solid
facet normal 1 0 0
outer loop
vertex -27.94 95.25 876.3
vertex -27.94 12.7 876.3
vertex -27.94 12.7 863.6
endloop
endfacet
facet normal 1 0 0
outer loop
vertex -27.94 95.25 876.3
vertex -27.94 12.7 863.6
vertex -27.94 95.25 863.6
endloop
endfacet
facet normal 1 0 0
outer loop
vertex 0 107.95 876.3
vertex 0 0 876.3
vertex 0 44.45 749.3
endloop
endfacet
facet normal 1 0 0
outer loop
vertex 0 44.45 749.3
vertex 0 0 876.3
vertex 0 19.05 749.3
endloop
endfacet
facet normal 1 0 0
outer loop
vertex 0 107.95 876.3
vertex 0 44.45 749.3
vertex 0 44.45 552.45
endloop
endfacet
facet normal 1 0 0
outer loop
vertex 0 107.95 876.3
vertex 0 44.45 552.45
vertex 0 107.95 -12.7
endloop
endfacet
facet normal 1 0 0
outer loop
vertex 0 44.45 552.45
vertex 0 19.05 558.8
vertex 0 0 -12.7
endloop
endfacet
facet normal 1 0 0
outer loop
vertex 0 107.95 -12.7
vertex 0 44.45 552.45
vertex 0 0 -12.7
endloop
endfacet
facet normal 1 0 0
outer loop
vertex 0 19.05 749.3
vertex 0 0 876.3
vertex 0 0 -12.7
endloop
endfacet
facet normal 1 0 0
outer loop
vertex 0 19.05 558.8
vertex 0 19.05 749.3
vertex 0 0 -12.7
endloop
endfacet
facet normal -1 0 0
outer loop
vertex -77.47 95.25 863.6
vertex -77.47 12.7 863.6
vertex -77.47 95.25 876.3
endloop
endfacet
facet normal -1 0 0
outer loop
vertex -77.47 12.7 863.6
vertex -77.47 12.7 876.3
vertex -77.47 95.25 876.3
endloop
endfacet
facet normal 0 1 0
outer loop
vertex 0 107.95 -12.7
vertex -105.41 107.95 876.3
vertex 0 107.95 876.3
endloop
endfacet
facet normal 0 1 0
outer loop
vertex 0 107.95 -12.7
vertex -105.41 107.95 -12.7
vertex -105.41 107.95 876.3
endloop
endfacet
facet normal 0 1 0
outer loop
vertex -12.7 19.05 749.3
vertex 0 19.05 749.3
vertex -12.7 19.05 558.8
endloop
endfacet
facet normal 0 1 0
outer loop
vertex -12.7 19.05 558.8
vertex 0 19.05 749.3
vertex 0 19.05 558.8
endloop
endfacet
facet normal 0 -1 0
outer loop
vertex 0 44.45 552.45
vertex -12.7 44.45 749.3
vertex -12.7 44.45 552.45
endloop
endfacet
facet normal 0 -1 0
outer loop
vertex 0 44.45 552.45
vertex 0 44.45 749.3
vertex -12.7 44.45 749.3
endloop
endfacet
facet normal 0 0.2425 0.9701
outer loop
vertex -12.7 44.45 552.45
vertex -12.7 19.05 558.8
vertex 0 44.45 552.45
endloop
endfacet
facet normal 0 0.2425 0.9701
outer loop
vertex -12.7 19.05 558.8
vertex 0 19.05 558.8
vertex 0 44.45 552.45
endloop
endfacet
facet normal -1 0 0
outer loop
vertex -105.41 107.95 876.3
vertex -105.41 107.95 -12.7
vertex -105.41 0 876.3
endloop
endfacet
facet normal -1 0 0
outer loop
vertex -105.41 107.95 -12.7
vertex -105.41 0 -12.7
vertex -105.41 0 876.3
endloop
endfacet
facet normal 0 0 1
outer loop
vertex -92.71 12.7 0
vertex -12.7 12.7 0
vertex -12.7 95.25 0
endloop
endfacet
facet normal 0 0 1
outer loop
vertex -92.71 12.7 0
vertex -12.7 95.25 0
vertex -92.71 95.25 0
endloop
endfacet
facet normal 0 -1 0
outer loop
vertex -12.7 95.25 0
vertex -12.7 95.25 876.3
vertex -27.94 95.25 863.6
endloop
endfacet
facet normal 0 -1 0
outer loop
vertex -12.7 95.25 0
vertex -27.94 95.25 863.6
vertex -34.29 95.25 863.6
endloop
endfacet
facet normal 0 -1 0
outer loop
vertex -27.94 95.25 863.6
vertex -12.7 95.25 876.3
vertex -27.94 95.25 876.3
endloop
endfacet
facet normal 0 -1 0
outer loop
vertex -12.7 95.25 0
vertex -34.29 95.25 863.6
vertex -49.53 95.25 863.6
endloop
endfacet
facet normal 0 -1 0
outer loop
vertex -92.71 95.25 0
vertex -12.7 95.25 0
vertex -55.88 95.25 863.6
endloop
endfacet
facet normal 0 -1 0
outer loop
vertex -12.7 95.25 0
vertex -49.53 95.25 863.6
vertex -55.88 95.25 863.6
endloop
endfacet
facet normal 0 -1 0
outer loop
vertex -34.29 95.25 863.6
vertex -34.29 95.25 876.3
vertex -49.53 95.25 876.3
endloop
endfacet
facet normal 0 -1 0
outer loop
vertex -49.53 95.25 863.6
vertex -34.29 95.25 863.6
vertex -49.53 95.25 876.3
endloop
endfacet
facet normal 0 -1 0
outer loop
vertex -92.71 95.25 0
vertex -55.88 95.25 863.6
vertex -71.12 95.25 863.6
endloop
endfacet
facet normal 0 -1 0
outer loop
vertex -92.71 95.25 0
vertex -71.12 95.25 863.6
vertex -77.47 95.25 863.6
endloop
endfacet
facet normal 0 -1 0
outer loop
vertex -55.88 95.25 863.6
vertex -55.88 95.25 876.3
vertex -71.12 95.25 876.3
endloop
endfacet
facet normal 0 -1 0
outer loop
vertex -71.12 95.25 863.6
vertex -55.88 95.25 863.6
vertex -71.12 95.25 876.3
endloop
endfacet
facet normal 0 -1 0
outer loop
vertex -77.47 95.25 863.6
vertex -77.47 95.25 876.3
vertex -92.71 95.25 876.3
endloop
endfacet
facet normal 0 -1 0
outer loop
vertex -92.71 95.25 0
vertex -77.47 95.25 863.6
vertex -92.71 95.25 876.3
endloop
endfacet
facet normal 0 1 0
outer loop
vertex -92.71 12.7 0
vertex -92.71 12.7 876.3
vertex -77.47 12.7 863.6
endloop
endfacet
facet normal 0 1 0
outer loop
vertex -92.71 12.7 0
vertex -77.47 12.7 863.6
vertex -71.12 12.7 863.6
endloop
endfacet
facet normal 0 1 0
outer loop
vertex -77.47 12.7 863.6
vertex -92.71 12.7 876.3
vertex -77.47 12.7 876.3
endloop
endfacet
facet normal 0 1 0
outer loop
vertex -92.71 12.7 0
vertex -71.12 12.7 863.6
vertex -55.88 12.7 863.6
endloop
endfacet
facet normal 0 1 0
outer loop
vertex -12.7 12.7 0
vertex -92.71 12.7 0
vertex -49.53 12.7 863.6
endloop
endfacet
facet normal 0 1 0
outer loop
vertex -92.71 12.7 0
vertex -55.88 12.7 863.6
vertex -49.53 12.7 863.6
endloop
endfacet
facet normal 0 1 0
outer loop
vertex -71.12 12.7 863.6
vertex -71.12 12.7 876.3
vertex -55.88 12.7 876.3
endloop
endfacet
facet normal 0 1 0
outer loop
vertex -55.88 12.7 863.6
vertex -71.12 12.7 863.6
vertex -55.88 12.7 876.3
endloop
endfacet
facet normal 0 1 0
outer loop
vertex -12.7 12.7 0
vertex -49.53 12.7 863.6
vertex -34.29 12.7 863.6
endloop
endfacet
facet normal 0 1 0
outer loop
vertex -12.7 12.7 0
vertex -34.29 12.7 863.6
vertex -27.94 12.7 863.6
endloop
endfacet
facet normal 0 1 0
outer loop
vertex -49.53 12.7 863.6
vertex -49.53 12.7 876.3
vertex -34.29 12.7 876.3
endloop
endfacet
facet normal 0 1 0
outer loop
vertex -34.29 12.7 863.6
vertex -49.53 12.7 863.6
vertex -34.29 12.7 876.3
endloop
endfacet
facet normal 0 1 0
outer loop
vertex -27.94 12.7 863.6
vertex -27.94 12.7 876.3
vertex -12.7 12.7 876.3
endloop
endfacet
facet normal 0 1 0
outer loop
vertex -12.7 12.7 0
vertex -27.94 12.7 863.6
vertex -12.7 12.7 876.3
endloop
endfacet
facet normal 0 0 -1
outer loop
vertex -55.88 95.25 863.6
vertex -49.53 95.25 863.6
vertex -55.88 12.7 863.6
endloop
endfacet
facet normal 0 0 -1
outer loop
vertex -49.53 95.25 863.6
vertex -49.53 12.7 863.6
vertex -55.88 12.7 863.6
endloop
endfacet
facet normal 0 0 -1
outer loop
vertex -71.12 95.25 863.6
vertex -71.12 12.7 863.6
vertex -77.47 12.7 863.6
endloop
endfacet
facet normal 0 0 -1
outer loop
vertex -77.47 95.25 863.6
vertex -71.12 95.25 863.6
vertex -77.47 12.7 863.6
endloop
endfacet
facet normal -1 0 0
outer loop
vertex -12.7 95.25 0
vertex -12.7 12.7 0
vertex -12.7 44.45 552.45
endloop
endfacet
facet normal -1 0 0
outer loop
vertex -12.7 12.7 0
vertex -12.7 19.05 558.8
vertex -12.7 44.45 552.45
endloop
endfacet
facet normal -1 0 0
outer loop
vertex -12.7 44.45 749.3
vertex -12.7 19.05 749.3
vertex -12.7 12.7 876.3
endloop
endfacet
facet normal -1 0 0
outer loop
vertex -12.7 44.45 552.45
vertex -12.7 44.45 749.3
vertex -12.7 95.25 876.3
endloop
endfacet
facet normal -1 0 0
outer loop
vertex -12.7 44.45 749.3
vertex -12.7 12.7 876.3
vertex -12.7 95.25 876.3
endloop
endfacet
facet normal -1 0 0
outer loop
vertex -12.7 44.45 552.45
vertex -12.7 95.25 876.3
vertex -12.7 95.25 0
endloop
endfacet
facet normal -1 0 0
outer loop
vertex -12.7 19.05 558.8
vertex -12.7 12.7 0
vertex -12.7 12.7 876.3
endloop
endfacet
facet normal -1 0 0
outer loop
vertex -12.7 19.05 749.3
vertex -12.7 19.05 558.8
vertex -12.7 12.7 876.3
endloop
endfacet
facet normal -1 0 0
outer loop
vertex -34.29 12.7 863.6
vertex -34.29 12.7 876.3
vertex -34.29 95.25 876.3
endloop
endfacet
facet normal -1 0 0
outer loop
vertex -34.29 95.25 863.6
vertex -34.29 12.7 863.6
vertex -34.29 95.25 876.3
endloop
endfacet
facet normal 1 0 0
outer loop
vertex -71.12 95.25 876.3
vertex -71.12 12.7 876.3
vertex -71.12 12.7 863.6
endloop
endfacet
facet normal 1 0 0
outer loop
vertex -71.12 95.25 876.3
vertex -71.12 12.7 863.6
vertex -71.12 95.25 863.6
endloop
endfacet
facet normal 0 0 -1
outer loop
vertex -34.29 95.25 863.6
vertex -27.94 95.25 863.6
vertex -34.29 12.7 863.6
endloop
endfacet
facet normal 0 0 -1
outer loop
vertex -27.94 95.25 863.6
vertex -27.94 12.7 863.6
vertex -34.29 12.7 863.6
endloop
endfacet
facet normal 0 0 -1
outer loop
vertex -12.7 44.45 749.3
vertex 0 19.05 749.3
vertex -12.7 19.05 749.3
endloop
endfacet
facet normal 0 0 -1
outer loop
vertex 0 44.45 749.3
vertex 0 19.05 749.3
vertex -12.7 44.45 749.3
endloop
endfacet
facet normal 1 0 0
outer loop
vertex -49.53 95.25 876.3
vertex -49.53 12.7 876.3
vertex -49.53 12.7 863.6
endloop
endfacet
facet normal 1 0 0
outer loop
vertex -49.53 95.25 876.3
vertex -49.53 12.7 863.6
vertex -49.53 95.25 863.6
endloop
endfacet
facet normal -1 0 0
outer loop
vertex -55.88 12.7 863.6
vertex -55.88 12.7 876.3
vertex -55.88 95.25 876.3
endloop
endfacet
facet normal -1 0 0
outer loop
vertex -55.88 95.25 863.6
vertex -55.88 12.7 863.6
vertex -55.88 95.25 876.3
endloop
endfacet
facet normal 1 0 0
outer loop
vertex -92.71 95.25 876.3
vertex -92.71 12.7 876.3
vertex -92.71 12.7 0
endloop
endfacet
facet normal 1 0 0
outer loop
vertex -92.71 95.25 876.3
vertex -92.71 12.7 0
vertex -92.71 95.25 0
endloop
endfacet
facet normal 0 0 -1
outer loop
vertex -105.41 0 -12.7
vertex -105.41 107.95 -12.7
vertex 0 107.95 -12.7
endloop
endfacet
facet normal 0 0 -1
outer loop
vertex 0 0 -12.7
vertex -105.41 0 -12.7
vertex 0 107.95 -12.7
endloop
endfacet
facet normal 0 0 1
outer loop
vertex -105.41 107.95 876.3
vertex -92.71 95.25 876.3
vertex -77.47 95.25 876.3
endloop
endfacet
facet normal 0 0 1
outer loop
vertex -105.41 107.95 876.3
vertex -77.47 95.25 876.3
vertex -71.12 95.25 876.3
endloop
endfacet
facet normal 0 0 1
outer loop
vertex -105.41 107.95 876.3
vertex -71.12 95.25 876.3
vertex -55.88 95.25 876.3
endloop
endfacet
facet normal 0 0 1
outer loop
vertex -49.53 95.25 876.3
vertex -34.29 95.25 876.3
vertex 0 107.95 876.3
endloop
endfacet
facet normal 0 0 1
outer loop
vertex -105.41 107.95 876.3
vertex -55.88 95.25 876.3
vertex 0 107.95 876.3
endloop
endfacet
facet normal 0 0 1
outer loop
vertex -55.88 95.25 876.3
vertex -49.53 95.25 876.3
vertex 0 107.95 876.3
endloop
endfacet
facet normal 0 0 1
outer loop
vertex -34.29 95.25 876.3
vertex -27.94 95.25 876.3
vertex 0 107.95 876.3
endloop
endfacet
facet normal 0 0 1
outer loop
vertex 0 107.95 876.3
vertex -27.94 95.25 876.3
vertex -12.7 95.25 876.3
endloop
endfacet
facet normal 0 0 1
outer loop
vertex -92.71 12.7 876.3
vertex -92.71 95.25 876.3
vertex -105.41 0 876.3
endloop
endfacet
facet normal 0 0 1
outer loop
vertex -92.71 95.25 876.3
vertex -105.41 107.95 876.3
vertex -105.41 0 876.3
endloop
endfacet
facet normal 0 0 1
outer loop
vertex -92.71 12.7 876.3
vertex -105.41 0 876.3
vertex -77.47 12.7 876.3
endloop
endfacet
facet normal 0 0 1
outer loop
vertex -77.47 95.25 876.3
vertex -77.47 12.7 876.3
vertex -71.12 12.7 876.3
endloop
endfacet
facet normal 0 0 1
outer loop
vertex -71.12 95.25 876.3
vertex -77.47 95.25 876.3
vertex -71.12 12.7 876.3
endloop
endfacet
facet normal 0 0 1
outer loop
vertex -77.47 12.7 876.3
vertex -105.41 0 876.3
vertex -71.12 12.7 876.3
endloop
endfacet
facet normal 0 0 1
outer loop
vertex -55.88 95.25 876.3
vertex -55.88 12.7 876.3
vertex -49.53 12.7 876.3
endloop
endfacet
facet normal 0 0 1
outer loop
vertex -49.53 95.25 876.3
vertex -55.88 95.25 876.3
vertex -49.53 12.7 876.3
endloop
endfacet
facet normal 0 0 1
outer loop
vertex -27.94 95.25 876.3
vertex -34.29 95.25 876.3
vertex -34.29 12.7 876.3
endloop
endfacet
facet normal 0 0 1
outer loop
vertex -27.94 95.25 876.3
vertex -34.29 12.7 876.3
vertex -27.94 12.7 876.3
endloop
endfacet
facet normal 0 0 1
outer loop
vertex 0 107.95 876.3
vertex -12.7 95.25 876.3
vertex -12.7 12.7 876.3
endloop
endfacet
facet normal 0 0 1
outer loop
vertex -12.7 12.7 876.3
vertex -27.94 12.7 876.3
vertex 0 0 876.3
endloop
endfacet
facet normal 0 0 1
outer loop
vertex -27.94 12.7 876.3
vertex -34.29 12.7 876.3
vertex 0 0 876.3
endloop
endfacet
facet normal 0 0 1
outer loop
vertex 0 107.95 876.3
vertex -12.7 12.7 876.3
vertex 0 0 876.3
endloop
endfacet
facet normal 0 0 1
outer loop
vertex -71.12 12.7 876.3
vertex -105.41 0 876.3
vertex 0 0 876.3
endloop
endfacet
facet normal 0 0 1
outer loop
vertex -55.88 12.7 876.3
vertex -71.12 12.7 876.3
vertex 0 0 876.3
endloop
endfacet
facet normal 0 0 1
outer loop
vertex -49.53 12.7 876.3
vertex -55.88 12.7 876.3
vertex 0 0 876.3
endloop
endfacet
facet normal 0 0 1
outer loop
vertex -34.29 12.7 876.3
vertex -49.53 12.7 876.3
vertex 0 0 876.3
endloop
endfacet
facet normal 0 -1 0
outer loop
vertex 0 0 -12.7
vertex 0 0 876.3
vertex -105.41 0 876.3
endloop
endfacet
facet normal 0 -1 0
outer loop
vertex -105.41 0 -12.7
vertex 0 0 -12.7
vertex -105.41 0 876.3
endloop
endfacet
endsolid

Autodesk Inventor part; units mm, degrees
ref_plane "YZ Plane" through (0, 0, 0) normal (1, 0, 0) x (0, 1, 0)
ref_plane "XZ Plane" through (0, 0, 0) normal (0, 1, 0) x (-1, 0, 0)
ref_plane "XY Plane" through (0, 0, 0) normal (0, 0, 1) x (1, 0, 0)
sketch "Sketch1" plane through (0, 0, 0) normal (0, 1, 0) x (-1, 0, 0)
  line L0 (0, 0) -> (105.41, 0)
  line L1 (105.41, 0) -> (105.41, 863.6)
  line L2 (105.41, 863.6) -> (0, 863.6)
  line L3 (0, 863.6) -> (0, 0)
  dimension "d0" = 105.41
  dimension "d1" = 863.6
extrude "Extrusion1" add sketch "Sketch1" along normal blind 12.7
sketch "Sketch2" plane through (0, 12.7, 0) normal (0, 1, 0) x (1, 0, 0)
  line L0 (0, 0) -> (-105.41, 0) projected
  line L1 (0, 0) -> (-12.7, 0)
  line L2 (-12.7, 0) -> (-12.7, 12.7)
  line L3 (-12.7, 12.7) -> (0, 12.7)
  line L4 (0, 12.7) -> (0, 0)
  line L5 (-105.41, 0) -> (-105.41, -863.6) projected
  line L6 (0, 12.7) -> (-105.41, 12.7)
  line L7 (-105.41, 12.7) -> (-105.41, 0)
  line L8 (-105.41, 0) -> (0, 0)
  line L9 (0, 0) -> (0, 12.7)
  line L10 (0, -863.6) -> (0, 0) projected
  line L11 (0, -863.6) -> (-105.41, -863.6)
  line L12 (-105.41, -863.6) -> (-105.41, -876.3)
  line L13 (-105.41, -876.3) -> (0, -876.3)
  line L14 (0, -876.3) -> (0, -863.6)
  line L15 (-105.41, -863.6) -> (-92.71, -863.6)
  line L16 (-92.71, -863.6) -> (-92.71, 12.7)
  line L17 (-92.71, 12.7) -> (-105.41, 12.7)
  line L18 (-105.41, 12.7) -> (-105.41, -863.6)
  line L19 (0, 12.7) -> (-12.7, 12.7)
  line L20 (-12.7, 12.7) -> (-12.7, -876.3)
  line L21 (-12.7, -876.3) -> (0, -876.3)
  line L22 (0, -876.3) -> (0, 12.7)
  point P0 (-12.7, -863.6)
  point P1 (-92.71, 0)
  dimension "d4" = 12.7
  dimension "d5" = 12.7
  dimension "d6" = 12.7
  dimension "d7" = 12.7
  dimension "d8" = 12.7
extrude "Extrusion2" add sketch "Sketch2" along normal blind 95.25 and the other way blind 12.7 contours L10 L11 L20 L0 | L0 L2 L3 L4 | L0 L16 L6 L2 | L14 L13 L20 L11 | L16 L11 L5 L0 | L0 L7 L6 L16 | L20 L13 L12 L11
sketch "Sketch3" plane through (-105.41, 107.95, 876.3) normal (0, 0, 1) x (1, 0, 0)
  line L0 (12.7, -95.25) -> (92.71, -95.25) projected
  line L1 (12.7, -95.25) -> (12.7, 0) projected
  line L2 (92.71, -95.25) -> (92.71, 0) projected
  line L3 (92.71, -95.25) -> (77.47, -95.25)
  line L4 (77.47, -95.25) -> (77.47, -12.7)
  line L5 (77.47, -12.7) -> (92.71, -12.7)
  line L6 (92.71, -12.7) -> (92.71, -95.25)
  line L7 (12.7, -95.25) -> (27.94, -95.25)
  line L8 (27.94, -95.25) -> (27.94, -12.7)
  line L9 (27.94, -12.7) -> (12.7, -12.7)
  line L10 (12.7, -12.7) -> (12.7, -95.25)
  line L11 (27.94, -95.25) -> (34.29, -95.25)
  line L12 (34.29, -95.25) -> (34.29, -12.7)
  line L13 (34.29, -12.7) -> (27.94, -12.7)
  line L14 (27.94, -12.7) -> (27.94, -95.25)
  line L15 (77.47, -95.25) -> (71.12, -95.25)
  line L16 (71.12, -95.25) -> (71.12, -12.7)
  line L17 (71.12, -12.7) -> (77.47, -12.7)
  line L18 (77.47, -12.7) -> (77.47, -95.25)
  line L19 (34.29, -95.25) -> (49.53, -95.25)
  line L20 (49.53, -95.25) -> (49.53, -12.7)
  line L21 (49.53, -12.7) -> (34.29, -12.7)
  line L22 (34.29, -12.7) -> (34.29, -95.25)
  line L23 (71.12, -95.25) -> (55.88, -95.25)
  line L24 (55.88, -95.25) -> (55.88, -12.7)
  line L25 (55.88, -12.7) -> (71.12, -12.7)
  line L26 (71.12, -12.7) -> (71.12, -95.25)
  point P0 (105.41, -107.95)
  dimension "d13" = 15.24
  dimension "d14" = 82.55
  dimension "d15" = 15.24
  dimension "d16" = 6.35
  dimension "d17" = 6.35
  dimension "d18" = 15.24
  dimension "d19" = 15.24
extrude "Extrusion3" cut sketch "Sketch3" against normal blind 95.25 contours L1 L9 L8 L0 | L24 L25 L16 L0 | L12 L21 L20 L0 | L4 L5 L2 L0
sketch "Sketch5" plane through (-105.41, 107.95, 876.3) normal (0, 0, 1) x (1, 0, 0)
  line L0 (71.12, -95.25) -> (55.88, -95.25) projected
  line L1 (55.88, -95.25) -> (55.88, -12.7) projected
  line L2 (55.88, -12.7) -> (71.12, -12.7) projected
  line L3 (71.12, -12.7) -> (71.12, -95.25) projected
  line L4 (49.53, -95.25) -> (34.29, -95.25) projected
  line L5 (34.29, -95.25) -> (34.29, -12.7) projected
  line L6 (34.29, -12.7) -> (49.53, -12.7) projected
  line L7 (49.53, -12.7) -> (49.53, -95.25) projected
  line L8 (92.71, -95.25) -> (77.47, -95.25) projected
  line L9 (77.47, -95.25) -> (77.47, -12.7) projected
  line L10 (77.47, -12.7) -> (92.71, -12.7) projected
  line L11 (92.71, -12.7) -> (92.71, -95.25) projected
  line L12 (27.94, -95.25) -> (12.7, -95.25) projected
  line L13 (12.7, -95.25) -> (12.7, -12.7) projected
  line L14 (12.7, -12.7) -> (27.94, -12.7) projected
  line L15 (27.94, -12.7) -> (27.94, -95.25) projected
  line L16 (105.41, -107.95) -> (105.41, 0) projected
  line L17 (0, 0) -> (105.41, 0) projected
  line L18 (0, -107.95) -> (0, 0) projected
  line L19 (105.41, -107.95) -> (0, -107.95) projected
  line L20 (92.71, 0) -> (12.7, 0) projected
  circle A0 centre (52.705, 26.3525) radius 26.3525
  dimension "d40" = 52.705
extrude "Extrusion4" add sketch "Sketch5" against normal blind 1270 contours A0
sketch "Sketch6" plane through (0, 0, -12.7) normal (1, 0, 0) x (0, 0, -1)
  line L0 (0, 0) -> (-889, 0) projected
  line L1 (-444.5, 0) -> (-444.5, 160.655)
  line L2 (-889, 160.655) -> (381, 160.655) projected
  line L3 (-444.5, 160.655) -> (-444.5, 167.005)
  line L4 (-444.5, 0) -> (-444.5, -6.35)
  line L5 (-444.5, 167.005) -> (-428.625, 167.005)
  line L6 (-428.625, 167.005) -> (-460.375, 167.005)
  line L7 (-428.625, 167.005) -> (-460.375, 167.005)
  line L8 (-460.375, 167.005) -> (-460.375, -6.35)
  line L9 (-460.375, -6.35) -> (-428.625, -6.35)
  line L10 (-428.625, -6.35) -> (-428.625, 167.005)
  line L11 (-889, 0) -> (-793.75, 0)
  line L12 (0, 107.95) -> (0, 0) projected
  line L13 (0, 0) -> (-95.25, 0)
  line L14 (-95.25, 0) -> (-95.25, -6.35)
  line L15 (-793.75, 0) -> (-793.75, -6.35)
  line L16 (-793.75, -6.35) -> (-762, -6.35)
  line L17 (-762, -6.35) -> (-762, 167.005)
  line L18 (-762, 167.005) -> (-793.75, 167.005)
  line L19 (-793.75, 167.005) -> (-793.75, -6.35)
  line L20 (-95.25, -6.35) -> (-127, -6.35)
  line L21 (-127, -6.35) -> (-127, 167.005)
  line L22 (-127, 167.005) -> (-95.25, 167.005)
  line L23 (-95.25, 167.005) -> (-95.25, -6.35)
  line L24 (-111.125, 167.005) -> (-111.125, -6.35)
  line L25 (-777.875, -6.35) -> (-777.875, 167.005)
  line L26 (-777.875, 79.2503) -> (-762, 79.2503)
  line L27 (-111.125, 68.9503) -> (-95.25, 68.9503)
  line L28 (-451.8389, 167.005) -> (-451.8389, 163.0426)
  circle A0 centre (-444.5, 148.7424) radius 10.8761
  circle A1 centre (-444.5, 11.9126) radius 11.9126
  line L29 (-456.4123, 12.0028) -> (-455.3758, 148.8248)
  line L30 (-433.6242, 148.8248) -> (-432.5877, 12.0028)
  line L31 (-127, 12.7) -> (-139.7, 12.7)
  line L32 (-139.7, 12.7) -> (-165.1, 12.7)
  line L33 (-460.375, 21.426) -> (-473.075, 21.426)
  line L34 (0, 107.95) -> (-889, 107.95) projected
  line L35 (-524.7767, 107.95) -> (-524.7767, 0)
  line L36 (-524.7767, 53.975) -> (-485.775, 53.975)
  circle A2 centre (-485.775, 53.975) radius 12.7
  line L37 (-498.475, 0) -> (-498.475, -3.175)
  line L38 (-498.475, -3.175) -> (-473.075, -3.175)
  line L39 (-473.075, -3.175) -> (-473.075, 53.975)
  line L40 (-498.475, 53.975) -> (-498.475, 0)
  line L41 (-694.0635, 0) -> (-694.0635, 19.05)
  line L42 (-762, 19.05) -> (-571.5, 19.05)
  line L43 (-687.1312, 19.05) -> (-687.1312, 44.45)
  line L44 (-762, 44.45) -> (-565.15, 44.45)
  line L45 (-571.5, 19.05) -> (-565.15, 44.45)
  point P0 (-12.7, 0)
  dimension "d25" = 6.35
  dimension "d26" = 6.35
  dimension "d27" = 15.875
  dimension "d28" = 31.75
  dimension "d29" = 95.25
  dimension "d30" = 95.25
  dimension "d31" = 6.35
  dimension "d32" = 6.35
  dimension "d33" = 31.75
  dimension "d34" = 31.75
  dimension "d35" = 3.9624
  dimension "d39" = 23.8252
  dimension "d41" = 12.7
  dimension "d42" = 25.4
  dimension "d43" = 12.7
  dimension "d45" = 19.05
  dimension "d46" = 190.5
  dimension "d47" = 25.4
  dimension "d48" = 196.85
sketch "Sketch7" plane through (-105.41, 0, 876.3) normal (0, 0, 1) x (1, 0, 0)
  point P0 (105.41, 0)
extrude "Extrusion5" cut sketch "Sketch6" against normal blind 15.24 contours L42 L17 L44 L43 | L43 L44 L45 L42
sketch "Sketch8" plane through (0, 107.95, 0) normal (0, 1, 0) x (1, 0, 0)
  line L0 (0, -876.3) -> (0, 12.7) projected
  line L1 (-105.41, 12.7) -> (-105.41, -876.3) projected
  line L2 (0, 12.7) -> (-105.41, 12.7)
  line L3 (-105.41, 12.7) -> (-105.41, -876.3)
  line L4 (-105.41, -876.3) -> (0, -876.3)
  line L5 (0, -876.3) -> (0, 12.7)
  point P0 (0, 0)
extrude "Extrusion6" add sketch "Sketch8" against normal blind 12.7
sketch "Sketch9" plane through (-52.705, 134.3025, 876.3) normal (0, 0, 1) x (1, 0, 0)
  line L0 (-52.705, -26.3525) -> (0, -26.3525) projected
  line L1 (-39.5109, -26.3525) -> (301.585, -26.3525)
  line L2 (301.585, -26.3525) -> (301.585, 239.994)
  line L3 (301.585, 239.994) -> (-39.5109, 239.994)
  line L4 (-39.5109, 239.994) -> (-39.5109, -26.3525)
  point P0 (52.705, -134.3025)
extrude "Extrusion7" cut sketch "Sketch9" against normal through all
sketch "Sketch10" plane through (-105.41, 0, 876.3) normal (0, 0, 1) x (1, 0, 0)
  point P0 (105.41, 0)
properties part number "box"
